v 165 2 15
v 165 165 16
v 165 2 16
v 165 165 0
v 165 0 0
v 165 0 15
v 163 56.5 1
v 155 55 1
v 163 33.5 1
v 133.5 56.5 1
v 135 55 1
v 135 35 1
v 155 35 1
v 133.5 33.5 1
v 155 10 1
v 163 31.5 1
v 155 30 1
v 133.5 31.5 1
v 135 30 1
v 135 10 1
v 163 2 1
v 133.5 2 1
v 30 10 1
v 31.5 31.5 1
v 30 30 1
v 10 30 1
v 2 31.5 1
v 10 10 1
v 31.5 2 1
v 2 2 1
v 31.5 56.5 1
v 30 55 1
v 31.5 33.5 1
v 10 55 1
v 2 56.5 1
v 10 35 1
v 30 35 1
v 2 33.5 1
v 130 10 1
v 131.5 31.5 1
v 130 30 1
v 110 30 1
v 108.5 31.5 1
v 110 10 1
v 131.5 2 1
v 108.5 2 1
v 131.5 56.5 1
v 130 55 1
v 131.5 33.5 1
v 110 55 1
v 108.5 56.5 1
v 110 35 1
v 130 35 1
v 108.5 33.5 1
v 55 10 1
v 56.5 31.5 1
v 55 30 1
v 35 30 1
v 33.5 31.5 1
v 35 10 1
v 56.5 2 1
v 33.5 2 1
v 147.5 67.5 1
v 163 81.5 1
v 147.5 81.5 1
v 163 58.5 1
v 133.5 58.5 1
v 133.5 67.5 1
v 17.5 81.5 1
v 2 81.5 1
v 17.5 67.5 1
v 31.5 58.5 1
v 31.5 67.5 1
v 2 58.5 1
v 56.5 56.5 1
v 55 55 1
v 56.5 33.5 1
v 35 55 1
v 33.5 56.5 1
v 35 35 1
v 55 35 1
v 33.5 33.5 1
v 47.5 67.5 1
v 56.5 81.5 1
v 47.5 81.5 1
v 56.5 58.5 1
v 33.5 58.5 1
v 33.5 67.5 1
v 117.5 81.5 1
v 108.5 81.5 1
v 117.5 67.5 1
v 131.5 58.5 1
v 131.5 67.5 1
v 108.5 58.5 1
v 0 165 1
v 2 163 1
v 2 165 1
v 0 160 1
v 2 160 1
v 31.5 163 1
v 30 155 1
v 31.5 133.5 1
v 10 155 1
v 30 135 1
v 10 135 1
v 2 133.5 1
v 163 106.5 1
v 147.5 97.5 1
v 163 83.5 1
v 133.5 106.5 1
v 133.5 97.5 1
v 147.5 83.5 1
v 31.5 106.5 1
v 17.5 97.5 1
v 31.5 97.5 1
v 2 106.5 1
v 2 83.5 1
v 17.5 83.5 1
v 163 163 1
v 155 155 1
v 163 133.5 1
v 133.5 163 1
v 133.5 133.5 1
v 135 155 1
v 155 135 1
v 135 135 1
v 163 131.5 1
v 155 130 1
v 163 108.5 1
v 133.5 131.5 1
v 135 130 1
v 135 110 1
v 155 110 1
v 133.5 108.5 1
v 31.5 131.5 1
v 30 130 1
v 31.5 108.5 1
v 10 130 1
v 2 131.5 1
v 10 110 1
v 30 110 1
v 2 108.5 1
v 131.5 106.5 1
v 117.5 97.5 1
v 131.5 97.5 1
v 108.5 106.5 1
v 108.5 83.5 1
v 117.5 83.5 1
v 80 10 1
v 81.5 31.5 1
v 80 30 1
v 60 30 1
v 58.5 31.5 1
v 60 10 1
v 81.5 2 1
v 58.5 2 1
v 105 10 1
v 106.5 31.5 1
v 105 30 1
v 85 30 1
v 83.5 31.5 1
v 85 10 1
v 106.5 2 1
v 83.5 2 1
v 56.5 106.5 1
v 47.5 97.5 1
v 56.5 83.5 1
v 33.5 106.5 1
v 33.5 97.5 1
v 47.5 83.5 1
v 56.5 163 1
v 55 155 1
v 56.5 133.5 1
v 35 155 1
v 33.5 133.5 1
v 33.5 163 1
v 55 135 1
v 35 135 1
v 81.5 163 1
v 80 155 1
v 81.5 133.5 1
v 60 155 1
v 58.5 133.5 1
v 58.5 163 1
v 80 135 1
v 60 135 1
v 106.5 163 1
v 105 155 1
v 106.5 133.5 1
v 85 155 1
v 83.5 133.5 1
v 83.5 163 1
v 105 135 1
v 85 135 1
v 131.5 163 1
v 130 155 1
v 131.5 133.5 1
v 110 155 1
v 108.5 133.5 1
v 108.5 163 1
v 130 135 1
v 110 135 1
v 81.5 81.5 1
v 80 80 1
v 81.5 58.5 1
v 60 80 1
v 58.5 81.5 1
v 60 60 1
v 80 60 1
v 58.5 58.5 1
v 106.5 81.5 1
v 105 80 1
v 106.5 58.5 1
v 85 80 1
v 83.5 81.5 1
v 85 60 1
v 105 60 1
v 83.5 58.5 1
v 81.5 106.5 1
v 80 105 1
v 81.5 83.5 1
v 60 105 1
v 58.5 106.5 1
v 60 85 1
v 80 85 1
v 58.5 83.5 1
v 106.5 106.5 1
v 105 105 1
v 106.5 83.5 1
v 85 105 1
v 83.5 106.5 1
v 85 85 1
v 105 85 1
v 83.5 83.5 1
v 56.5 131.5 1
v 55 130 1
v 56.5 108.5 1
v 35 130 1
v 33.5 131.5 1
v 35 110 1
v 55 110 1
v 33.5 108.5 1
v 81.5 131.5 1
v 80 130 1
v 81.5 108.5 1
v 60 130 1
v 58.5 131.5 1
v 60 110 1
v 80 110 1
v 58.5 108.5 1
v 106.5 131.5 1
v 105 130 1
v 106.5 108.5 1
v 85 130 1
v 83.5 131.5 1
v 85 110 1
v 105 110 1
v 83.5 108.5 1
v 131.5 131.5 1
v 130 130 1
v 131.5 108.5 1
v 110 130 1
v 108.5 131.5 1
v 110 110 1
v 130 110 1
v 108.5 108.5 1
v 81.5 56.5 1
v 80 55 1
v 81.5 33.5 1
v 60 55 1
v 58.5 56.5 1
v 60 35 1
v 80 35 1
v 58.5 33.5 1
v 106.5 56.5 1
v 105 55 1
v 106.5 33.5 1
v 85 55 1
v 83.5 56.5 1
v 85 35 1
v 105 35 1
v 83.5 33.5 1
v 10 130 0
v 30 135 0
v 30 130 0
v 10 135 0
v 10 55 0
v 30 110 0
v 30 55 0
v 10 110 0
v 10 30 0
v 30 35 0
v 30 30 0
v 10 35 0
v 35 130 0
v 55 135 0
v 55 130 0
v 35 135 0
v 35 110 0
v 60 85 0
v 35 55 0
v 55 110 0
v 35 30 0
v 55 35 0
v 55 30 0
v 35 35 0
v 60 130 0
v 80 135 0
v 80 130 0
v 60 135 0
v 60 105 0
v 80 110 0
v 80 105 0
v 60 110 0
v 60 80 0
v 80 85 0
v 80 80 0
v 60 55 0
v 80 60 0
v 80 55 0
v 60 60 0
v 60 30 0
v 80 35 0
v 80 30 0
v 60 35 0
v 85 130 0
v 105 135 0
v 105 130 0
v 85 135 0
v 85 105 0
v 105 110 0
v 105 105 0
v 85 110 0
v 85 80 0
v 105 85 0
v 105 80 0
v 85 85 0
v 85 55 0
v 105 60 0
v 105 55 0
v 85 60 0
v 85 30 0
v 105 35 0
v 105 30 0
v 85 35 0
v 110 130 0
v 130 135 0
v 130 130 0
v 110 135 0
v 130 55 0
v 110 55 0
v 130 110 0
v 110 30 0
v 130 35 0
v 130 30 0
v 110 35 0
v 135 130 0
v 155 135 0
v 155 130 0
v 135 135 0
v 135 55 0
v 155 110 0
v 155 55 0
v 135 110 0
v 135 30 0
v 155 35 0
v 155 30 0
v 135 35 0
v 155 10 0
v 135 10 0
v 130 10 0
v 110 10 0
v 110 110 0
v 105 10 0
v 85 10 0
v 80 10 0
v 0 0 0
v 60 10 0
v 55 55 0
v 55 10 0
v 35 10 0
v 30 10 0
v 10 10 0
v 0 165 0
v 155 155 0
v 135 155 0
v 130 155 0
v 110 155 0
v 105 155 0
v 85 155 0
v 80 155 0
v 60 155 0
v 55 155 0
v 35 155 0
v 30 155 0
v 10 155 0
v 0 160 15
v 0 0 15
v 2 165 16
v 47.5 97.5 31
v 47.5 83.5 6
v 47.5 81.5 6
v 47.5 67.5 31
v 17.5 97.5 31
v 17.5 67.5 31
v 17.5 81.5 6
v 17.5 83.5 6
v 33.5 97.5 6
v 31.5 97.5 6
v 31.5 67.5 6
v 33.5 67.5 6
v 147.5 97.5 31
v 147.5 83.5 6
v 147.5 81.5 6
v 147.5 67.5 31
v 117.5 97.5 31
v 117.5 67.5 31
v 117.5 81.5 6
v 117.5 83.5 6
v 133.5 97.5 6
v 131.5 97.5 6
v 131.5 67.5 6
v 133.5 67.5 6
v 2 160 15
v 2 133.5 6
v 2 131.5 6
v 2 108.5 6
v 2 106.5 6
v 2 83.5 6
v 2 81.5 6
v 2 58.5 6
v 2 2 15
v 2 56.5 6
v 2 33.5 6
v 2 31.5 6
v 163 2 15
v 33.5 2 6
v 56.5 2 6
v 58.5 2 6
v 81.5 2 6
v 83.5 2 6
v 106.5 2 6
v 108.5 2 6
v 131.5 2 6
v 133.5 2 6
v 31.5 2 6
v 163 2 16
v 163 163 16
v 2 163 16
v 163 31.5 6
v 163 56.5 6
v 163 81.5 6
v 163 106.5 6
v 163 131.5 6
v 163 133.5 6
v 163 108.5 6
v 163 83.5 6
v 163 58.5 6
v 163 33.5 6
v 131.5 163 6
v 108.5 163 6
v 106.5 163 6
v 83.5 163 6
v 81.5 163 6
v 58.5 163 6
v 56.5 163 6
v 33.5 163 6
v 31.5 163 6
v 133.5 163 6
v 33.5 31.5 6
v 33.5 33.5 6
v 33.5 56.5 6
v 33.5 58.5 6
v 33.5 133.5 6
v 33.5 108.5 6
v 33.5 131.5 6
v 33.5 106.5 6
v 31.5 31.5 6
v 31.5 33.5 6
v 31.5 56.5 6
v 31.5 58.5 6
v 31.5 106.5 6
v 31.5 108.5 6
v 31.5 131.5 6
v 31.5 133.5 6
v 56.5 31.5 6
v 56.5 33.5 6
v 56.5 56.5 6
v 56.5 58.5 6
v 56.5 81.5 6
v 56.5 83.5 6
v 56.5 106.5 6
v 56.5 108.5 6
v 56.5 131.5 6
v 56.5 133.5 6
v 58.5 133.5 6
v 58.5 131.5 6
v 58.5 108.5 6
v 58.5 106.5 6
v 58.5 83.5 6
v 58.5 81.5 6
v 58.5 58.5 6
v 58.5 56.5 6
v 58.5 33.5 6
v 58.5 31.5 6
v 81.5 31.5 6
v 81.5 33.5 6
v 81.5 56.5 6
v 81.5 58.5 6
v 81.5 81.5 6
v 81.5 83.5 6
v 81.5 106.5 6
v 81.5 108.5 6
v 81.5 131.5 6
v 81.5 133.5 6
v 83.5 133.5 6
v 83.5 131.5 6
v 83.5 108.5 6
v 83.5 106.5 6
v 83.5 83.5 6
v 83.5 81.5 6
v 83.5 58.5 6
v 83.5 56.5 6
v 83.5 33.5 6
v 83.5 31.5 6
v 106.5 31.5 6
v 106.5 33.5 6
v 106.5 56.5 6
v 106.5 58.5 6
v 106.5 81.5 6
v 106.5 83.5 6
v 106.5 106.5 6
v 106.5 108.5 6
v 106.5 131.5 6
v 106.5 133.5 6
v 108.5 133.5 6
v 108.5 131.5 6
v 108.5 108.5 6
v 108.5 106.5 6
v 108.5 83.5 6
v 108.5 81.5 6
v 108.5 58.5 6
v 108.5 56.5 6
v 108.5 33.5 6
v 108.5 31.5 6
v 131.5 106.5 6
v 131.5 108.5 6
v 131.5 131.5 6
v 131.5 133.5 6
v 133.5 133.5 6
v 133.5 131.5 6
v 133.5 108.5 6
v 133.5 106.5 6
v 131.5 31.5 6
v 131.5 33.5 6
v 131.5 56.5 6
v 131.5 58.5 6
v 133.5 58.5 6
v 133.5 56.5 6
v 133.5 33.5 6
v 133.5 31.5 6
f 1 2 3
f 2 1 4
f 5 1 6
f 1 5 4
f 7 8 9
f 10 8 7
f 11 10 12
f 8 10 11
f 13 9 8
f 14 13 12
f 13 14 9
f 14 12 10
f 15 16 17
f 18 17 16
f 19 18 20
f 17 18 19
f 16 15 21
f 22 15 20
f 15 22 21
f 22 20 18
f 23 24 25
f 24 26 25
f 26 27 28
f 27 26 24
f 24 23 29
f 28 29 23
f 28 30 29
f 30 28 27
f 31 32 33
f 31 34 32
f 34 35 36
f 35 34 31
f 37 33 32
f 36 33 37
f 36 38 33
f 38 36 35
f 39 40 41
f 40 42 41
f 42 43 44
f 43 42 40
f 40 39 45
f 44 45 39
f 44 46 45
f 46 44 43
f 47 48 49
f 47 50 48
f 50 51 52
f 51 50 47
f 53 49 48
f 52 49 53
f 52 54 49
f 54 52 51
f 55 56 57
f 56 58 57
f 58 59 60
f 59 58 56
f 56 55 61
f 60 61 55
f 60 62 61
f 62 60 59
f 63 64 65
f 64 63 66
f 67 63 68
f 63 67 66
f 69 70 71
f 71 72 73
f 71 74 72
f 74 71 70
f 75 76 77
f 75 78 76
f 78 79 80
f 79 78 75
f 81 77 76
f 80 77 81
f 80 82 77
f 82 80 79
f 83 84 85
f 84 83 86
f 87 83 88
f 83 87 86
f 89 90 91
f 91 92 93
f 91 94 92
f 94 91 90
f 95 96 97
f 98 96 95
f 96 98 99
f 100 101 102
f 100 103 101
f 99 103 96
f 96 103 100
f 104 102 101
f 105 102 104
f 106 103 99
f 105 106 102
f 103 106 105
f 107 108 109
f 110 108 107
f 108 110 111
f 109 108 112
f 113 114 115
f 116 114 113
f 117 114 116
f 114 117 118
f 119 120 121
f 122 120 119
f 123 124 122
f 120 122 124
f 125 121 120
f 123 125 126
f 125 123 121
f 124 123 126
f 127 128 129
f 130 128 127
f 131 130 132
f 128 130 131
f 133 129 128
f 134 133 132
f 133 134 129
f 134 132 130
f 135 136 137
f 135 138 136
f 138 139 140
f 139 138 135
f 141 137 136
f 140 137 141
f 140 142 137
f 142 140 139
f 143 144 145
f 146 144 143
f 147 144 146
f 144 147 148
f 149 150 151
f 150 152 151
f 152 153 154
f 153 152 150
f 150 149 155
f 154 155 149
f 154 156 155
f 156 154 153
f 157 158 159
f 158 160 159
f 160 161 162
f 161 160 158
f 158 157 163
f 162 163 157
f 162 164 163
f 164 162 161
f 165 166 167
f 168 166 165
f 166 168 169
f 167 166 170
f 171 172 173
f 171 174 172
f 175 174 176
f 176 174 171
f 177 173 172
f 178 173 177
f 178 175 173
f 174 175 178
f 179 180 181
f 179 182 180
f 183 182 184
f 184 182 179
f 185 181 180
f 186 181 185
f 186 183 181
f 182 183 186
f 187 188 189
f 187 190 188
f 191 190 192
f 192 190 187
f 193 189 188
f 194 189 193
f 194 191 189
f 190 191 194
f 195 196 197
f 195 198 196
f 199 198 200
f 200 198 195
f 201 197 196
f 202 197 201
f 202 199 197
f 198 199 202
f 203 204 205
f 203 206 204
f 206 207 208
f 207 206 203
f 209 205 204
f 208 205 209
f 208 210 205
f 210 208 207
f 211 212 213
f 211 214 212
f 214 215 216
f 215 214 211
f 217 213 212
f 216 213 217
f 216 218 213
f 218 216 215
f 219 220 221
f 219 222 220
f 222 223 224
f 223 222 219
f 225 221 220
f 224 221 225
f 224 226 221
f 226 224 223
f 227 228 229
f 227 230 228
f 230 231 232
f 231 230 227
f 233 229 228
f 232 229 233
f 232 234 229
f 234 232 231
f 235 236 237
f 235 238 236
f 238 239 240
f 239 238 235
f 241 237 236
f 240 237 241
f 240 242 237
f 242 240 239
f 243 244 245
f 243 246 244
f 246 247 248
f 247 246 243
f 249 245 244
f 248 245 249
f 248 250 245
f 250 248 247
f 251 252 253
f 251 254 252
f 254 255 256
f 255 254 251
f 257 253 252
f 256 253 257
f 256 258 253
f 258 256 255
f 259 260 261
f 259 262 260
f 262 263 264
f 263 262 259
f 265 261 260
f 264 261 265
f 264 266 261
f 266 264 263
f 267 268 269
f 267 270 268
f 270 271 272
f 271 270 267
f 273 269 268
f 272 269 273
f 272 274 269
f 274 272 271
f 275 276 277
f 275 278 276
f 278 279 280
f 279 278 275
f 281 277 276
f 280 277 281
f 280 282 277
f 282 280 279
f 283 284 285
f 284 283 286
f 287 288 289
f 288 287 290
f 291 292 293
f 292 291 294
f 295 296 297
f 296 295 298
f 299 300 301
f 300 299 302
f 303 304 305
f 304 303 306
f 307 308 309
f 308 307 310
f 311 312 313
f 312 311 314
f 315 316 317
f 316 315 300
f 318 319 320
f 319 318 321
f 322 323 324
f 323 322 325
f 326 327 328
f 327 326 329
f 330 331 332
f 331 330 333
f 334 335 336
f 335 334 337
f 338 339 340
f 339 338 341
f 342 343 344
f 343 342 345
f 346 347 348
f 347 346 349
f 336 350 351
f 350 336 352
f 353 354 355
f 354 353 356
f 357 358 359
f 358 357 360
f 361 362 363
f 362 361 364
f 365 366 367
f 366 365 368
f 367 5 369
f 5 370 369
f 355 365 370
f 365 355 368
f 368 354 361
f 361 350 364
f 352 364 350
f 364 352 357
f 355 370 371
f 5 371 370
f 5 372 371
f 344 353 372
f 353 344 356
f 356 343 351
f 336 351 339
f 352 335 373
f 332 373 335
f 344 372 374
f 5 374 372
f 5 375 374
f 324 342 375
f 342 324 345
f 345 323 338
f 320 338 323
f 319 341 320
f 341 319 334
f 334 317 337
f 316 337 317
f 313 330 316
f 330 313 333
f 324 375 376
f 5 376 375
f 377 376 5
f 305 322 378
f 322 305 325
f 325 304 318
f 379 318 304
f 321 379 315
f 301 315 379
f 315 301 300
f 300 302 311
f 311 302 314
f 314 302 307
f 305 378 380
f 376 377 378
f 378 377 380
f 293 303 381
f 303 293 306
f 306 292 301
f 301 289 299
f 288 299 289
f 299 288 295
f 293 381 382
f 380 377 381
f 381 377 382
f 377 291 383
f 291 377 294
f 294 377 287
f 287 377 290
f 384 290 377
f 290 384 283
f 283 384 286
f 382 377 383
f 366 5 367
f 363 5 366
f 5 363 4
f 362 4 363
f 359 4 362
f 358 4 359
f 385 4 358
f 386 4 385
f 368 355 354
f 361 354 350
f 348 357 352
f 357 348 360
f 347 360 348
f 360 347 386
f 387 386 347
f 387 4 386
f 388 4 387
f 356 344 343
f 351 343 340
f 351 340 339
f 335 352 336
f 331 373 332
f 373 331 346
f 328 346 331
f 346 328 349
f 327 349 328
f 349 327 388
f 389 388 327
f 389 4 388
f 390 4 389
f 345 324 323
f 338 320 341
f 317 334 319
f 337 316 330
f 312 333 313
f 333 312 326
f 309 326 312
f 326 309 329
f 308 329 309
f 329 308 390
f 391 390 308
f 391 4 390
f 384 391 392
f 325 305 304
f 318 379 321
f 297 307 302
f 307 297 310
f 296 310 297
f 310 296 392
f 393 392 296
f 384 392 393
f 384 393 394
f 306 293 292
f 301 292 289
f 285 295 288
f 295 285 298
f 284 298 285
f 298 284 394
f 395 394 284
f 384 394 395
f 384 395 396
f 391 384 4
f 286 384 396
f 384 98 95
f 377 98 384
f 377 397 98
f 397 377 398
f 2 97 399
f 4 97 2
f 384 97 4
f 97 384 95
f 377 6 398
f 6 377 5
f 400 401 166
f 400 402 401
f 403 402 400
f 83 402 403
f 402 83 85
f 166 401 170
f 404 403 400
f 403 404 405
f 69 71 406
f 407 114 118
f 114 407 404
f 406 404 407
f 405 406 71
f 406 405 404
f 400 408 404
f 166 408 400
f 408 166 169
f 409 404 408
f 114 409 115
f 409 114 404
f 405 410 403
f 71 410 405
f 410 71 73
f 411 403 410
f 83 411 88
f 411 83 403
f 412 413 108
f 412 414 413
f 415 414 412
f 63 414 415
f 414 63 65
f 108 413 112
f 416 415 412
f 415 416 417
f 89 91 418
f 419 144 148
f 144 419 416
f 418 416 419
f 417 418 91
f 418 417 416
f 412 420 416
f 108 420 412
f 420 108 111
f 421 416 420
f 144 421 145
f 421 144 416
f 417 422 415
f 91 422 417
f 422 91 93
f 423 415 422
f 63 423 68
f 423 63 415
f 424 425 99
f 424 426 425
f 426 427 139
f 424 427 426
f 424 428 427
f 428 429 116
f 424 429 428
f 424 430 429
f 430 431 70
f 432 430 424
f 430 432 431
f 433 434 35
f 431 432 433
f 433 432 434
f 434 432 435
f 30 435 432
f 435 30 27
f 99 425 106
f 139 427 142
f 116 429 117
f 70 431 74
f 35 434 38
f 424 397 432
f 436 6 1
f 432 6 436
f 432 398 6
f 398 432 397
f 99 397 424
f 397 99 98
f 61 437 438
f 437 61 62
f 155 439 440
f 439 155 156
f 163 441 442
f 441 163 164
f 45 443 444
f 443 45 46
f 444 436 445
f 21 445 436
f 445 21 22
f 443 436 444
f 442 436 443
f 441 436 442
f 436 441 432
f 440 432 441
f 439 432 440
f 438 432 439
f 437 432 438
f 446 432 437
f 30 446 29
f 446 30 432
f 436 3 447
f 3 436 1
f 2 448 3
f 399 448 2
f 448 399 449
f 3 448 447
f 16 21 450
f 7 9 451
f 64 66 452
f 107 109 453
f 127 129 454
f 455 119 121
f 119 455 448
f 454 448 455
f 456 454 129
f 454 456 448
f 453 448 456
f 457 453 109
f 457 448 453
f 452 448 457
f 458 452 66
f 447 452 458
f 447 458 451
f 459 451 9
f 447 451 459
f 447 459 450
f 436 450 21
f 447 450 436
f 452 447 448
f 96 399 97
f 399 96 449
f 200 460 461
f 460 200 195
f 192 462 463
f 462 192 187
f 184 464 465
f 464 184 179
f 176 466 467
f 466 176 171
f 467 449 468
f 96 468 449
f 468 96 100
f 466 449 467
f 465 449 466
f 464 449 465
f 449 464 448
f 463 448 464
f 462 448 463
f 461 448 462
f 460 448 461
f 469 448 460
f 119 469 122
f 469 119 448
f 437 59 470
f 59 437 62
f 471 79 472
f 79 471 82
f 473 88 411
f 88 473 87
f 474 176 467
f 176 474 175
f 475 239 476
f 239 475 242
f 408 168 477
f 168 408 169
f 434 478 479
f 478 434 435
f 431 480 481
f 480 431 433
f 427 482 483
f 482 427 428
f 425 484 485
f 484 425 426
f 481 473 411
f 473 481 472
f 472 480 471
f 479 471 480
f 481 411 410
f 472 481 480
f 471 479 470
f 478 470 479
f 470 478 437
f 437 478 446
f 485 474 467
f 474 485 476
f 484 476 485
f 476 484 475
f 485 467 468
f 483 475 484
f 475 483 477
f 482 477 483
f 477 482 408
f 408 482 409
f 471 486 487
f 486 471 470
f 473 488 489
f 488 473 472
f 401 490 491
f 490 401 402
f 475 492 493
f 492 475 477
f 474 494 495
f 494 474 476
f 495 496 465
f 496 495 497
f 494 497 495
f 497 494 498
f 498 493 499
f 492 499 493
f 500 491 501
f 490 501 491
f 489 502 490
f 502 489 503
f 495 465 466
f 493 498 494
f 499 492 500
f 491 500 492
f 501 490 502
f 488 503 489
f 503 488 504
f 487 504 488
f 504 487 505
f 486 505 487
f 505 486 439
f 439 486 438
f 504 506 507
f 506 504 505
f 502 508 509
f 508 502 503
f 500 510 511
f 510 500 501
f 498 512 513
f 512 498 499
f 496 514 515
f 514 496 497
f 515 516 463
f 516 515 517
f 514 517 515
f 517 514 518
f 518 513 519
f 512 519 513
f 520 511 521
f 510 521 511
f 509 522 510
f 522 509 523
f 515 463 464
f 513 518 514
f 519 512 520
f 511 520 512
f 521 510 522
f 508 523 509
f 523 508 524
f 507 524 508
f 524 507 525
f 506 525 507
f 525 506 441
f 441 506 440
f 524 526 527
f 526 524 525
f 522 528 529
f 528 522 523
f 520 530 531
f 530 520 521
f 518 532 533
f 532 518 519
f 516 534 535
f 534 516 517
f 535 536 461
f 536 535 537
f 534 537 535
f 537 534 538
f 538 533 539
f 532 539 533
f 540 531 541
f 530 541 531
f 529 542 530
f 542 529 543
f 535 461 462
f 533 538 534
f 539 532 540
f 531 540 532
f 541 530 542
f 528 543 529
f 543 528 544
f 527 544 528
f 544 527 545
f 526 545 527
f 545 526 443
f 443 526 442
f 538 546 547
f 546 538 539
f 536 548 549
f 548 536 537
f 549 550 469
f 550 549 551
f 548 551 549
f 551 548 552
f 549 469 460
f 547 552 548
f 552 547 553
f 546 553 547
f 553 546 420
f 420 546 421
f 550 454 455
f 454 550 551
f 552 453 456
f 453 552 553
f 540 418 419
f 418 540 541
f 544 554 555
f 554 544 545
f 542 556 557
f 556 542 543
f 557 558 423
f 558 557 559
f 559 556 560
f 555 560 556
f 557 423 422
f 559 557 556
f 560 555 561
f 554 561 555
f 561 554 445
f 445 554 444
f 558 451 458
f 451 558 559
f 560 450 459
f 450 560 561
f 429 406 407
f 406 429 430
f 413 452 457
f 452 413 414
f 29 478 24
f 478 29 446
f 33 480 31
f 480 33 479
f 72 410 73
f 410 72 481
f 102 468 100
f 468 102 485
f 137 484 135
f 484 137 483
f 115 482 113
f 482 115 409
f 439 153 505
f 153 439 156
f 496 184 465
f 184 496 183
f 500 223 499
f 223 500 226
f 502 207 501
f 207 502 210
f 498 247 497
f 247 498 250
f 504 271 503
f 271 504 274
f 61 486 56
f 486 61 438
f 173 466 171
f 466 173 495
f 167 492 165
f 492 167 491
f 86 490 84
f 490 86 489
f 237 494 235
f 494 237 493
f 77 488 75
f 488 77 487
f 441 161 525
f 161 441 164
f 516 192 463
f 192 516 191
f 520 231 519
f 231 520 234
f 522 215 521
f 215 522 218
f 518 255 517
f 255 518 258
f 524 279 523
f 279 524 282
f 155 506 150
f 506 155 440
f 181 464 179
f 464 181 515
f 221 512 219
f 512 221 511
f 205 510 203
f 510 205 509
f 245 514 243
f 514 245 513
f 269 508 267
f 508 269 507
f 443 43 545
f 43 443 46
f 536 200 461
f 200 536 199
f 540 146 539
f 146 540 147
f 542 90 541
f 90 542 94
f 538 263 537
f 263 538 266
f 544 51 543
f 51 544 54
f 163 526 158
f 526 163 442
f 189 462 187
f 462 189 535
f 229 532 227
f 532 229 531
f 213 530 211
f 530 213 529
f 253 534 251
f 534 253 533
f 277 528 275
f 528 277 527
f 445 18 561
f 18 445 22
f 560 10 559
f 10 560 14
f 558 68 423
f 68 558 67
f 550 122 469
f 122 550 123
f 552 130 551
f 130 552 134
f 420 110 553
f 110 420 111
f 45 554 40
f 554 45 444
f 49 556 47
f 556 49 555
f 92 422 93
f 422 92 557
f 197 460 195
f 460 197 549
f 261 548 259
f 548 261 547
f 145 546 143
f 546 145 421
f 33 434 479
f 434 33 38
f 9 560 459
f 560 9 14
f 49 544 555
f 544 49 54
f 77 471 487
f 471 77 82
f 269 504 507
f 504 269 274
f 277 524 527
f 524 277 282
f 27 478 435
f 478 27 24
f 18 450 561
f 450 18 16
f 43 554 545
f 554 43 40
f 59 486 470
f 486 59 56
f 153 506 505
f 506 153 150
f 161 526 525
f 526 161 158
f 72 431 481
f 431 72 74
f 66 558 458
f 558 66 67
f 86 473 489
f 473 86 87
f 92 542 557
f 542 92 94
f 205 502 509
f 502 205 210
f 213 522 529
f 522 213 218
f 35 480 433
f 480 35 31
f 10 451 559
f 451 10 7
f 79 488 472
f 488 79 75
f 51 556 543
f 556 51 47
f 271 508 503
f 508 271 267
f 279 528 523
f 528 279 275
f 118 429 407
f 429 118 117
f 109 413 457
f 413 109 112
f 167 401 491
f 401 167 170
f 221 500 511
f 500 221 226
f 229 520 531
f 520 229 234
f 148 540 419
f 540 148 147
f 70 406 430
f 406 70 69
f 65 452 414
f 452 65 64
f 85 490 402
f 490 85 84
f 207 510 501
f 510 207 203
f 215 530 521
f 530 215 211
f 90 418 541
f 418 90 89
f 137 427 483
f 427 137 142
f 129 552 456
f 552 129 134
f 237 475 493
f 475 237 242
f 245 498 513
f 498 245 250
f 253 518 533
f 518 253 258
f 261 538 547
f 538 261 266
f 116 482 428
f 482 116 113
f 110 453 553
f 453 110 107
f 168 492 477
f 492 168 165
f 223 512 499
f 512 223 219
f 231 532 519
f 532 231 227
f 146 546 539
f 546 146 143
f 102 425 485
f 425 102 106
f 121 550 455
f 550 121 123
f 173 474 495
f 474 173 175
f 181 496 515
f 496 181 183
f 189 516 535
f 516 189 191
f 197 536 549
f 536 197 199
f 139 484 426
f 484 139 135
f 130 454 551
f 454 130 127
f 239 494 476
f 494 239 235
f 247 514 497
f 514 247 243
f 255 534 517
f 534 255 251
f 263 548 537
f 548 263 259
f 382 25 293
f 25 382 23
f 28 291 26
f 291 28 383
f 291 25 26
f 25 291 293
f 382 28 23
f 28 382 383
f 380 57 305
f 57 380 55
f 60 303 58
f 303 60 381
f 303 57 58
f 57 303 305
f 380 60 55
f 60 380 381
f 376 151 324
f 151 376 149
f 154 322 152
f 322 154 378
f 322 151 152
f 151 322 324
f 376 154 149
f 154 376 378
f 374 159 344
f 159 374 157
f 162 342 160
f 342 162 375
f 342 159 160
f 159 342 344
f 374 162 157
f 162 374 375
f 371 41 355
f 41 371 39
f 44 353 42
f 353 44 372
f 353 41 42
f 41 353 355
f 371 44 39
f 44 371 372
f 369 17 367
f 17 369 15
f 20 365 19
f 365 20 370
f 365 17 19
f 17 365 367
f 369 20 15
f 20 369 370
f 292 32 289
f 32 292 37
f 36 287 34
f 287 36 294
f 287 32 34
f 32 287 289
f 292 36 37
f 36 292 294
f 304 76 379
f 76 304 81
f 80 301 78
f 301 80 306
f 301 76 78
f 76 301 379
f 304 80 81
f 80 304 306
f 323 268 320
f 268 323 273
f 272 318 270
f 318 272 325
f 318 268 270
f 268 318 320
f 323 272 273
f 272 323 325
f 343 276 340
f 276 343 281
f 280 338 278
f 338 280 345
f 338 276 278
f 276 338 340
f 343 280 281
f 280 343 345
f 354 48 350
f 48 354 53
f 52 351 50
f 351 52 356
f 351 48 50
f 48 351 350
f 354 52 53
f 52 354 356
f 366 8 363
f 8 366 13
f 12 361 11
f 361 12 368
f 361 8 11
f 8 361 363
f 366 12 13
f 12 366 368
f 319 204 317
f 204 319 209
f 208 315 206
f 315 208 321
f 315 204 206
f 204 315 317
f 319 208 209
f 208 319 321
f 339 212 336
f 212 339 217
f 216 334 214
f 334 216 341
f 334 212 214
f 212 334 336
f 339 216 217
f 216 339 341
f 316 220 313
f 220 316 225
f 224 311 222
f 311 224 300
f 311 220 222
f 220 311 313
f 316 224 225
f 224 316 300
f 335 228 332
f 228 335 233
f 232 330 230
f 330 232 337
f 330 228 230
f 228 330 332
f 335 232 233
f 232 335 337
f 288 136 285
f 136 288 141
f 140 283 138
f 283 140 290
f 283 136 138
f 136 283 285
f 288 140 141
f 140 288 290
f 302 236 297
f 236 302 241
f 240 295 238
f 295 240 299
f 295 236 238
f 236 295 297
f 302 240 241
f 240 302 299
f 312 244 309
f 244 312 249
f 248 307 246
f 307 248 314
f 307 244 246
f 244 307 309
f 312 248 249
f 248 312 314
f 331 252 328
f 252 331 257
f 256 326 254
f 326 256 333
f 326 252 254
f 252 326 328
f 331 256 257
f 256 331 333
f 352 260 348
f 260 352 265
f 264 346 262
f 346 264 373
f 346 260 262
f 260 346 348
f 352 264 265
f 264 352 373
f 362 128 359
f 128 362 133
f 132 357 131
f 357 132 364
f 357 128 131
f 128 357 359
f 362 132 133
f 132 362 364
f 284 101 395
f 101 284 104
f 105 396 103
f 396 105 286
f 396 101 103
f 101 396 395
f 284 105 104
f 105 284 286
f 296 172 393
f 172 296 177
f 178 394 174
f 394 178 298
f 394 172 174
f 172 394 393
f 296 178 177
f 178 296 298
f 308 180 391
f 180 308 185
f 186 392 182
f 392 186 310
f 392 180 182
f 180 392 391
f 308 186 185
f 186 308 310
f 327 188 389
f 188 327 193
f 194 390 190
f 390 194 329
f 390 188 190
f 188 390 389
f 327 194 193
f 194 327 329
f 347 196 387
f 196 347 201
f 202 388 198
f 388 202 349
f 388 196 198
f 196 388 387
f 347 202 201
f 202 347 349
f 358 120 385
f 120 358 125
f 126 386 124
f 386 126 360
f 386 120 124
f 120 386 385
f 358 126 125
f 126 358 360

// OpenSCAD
difference() {

	union() {
		cube([165,165,1]);
		
		
//pyramid 1
		translate([17.5,67.5,1])cube([30,30,30]);
		
//Pyramid 2
		translate([117.5,67.5,1])cube([30,30,30]);
	
//frame
		cube([2,160,15]);
		cube([165,2,15]);
		translate([163,2,1])cube([2,163,15]);
		translate([2,163,1])cube([163,2,15]);

// along y
		translate([31.5,2,1])cube([2,162,5]);
		translate([56.5,2,1])cube([2,162,5]);
		translate([81.5,2,1])cube([2,162,5]);
		translate([106.5,2,1])cube([2,162,5]);
		translate([131.5,2,1])cube([2,162,5]);

//along x
		translate([2,31.5,1])cube([161,2,5]);
		translate([2,56.5,1])cube([161,2,5]);
		translate([2,81.5,1])cube([161,2,5]);
		translate([2,106.5,1])cube([161,2,5]);
		translate([2,131.5,1])cube([161,2,5]);

}
//row1
translate([10,10,-1]) cube([20,20,3]);
translate([35,10,-1]) cube([20,20,3]);
translate([60,10,-1]) cube([20,20,3]);
translate([85,10,-1]) cube([20,20,3]);
translate([110,10,-1]) cube([20,20,3]);
translate([135,10,-1]) cube([20,20,3]);
// row2
translate([10,35,-1]) cube([20,20,3]);
translate([35,35,-1]) cube([20,20,3]);
translate([60,35,-1]) cube([20,20,3]);
translate([85,35,-1]) cube([20,20,3]);
translate([110,35,-1]) cube([20,20,3]);
translate([135,35,-1]) cube([20,20,3]);
//row3
translate([60,60,-1]) cube([20,20,3]);
translate([85,60,-1]) cube([20,20,3]);

//row 4
translate([60,85,-1]) cube([20,20,3]);
translate([85,85,-1]) cube([20,20,3]);

//row5
translate([10,110,-1]) cube([20,20,3]);
translate([35,110,-1]) cube([20,20,3]);
translate([60,110,-1]) cube([20,20,3]);
translate([85,110,-1]) cube([20,20,3]);
translate([110,110,-1]) cube([20,20,3]);
translate([135,110,-1]) cube([20,20,3]);
//row6//row1
translate([10,135,-1]) cube([20,20,3]);
translate([35,135,-1]) cube([20,20,3]);
translate([60,135,-1]) cube([20,20,3]);
translate([85,135,-1]) cube([20,20,3]);
translate([110,135,-1]) cube([20,20,3]);
translate([135,135,-1]) cube([20,20,3]);
}
